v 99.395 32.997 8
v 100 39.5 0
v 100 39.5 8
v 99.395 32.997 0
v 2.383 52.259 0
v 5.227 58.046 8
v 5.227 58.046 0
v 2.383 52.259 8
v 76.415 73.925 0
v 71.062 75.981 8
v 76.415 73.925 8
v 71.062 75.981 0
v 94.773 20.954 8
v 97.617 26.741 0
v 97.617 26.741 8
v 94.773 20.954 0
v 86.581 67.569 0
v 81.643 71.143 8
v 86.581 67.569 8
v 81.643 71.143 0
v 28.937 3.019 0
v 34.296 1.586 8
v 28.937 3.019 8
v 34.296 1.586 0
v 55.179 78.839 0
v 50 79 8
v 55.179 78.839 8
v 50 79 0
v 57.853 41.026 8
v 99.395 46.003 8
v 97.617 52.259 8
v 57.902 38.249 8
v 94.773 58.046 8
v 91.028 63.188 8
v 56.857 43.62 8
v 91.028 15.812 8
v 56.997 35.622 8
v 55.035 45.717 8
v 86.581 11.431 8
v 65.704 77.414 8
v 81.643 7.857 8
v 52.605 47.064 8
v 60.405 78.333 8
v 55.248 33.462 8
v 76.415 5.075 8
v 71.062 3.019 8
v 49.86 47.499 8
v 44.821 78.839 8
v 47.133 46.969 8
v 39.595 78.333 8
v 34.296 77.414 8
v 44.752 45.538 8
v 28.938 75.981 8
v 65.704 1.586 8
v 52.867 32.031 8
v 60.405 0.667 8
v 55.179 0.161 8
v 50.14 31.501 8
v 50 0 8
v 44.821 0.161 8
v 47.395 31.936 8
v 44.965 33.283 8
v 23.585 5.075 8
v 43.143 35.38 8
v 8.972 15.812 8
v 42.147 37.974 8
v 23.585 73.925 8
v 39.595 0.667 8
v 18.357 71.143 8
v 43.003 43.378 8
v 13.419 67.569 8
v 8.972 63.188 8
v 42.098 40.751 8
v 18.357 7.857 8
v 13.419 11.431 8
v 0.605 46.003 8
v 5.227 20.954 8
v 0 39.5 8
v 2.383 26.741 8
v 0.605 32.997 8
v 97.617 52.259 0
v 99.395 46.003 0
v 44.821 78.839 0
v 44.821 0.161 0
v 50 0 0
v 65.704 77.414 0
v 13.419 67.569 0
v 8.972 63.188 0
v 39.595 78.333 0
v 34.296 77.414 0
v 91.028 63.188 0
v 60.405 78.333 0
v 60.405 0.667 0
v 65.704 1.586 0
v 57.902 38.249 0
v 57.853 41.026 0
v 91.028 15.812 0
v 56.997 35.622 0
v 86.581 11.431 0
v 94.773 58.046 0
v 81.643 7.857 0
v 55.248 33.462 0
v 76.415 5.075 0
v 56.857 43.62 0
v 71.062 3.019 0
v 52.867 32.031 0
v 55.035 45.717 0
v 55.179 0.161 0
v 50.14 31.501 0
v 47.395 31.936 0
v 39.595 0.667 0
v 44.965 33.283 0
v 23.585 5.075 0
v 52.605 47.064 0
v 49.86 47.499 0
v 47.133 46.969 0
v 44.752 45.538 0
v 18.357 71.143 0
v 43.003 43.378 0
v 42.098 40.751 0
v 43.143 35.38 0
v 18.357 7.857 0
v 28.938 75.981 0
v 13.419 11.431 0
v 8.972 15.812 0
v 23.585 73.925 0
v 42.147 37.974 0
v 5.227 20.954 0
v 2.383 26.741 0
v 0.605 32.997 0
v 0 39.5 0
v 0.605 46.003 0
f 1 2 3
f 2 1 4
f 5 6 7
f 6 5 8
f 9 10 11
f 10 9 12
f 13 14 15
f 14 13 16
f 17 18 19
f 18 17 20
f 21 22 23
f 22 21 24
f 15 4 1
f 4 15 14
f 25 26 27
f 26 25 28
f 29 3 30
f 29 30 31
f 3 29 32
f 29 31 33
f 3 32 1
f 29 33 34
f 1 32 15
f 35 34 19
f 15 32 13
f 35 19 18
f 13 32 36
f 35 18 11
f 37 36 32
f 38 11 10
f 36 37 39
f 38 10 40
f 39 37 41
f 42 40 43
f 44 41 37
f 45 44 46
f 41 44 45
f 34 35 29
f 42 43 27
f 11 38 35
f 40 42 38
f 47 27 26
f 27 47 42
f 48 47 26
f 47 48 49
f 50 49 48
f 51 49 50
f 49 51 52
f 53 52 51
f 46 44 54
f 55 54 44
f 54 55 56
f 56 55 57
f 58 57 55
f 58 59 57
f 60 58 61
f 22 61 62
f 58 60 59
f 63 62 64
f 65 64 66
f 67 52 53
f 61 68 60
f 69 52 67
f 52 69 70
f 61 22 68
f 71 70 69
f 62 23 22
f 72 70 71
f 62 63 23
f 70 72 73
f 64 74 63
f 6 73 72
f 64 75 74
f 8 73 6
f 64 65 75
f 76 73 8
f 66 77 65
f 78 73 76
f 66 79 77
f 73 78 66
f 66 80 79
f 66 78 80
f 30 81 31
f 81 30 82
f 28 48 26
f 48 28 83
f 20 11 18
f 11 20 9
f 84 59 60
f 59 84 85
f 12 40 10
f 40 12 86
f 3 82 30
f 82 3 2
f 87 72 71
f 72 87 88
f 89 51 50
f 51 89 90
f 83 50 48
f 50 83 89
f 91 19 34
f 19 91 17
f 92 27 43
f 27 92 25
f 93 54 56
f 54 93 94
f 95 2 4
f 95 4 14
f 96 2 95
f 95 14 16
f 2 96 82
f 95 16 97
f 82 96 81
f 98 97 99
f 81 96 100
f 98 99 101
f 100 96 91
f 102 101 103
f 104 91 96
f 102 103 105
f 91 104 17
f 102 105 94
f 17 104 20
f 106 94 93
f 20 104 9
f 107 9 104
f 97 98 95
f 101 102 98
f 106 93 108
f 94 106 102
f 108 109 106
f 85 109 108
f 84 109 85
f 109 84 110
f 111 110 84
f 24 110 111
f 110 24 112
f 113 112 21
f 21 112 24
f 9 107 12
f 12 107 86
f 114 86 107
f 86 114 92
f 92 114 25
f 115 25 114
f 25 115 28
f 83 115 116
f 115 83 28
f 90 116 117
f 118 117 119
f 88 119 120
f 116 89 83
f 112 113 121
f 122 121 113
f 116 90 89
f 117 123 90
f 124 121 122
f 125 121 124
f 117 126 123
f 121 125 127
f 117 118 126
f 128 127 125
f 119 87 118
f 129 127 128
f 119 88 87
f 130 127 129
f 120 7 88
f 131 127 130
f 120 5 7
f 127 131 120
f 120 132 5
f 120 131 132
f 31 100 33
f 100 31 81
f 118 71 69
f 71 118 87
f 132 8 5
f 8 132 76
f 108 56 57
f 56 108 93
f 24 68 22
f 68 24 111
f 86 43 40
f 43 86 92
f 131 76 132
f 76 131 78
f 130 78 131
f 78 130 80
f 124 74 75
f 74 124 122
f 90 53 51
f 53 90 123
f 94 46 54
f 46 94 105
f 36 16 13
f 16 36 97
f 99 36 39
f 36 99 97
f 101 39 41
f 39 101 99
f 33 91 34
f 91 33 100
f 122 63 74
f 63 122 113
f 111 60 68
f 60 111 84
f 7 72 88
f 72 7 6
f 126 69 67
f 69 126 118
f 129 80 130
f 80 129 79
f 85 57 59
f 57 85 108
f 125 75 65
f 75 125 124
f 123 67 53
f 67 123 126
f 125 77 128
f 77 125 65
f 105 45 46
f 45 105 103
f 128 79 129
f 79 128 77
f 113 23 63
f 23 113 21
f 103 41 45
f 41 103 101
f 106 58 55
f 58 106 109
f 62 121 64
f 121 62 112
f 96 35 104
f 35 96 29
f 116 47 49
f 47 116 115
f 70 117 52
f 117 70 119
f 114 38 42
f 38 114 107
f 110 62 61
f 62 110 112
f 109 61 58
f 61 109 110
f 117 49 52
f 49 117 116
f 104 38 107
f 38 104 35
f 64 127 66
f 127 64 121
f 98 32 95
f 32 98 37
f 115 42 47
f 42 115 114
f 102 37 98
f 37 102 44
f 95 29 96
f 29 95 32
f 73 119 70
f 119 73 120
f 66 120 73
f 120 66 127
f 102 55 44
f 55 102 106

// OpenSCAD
$fn = 32;

// ----------------------------------------------------------------------
// Cam plate: double_lobe cam, base R36
// ----------------------------------------------------------------------

// --- parameters (mm) ---
base_r = 36;              // base circle radius
lobe_h = 14;              // cam lobe rise
bore_r = 8;               // shaft bore radius
plate_t = 8;              // plate thickness, Z (extrusion height)

profile = [[100, 39.5], [99.395, 46.003], [97.617, 52.259], [94.773, 58.046], [91.028, 63.188], [86.581, 67.569], [81.643, 71.143], [76.415, 73.925], [71.062, 75.981], [65.704, 77.414], [60.405, 78.333], [55.179, 78.839], [50, 79], [44.821, 78.839], [39.595, 78.333], [34.296, 77.414], [28.938, 75.981], [23.585, 73.925], [18.357, 71.143], [13.419, 67.569], [8.972, 63.188], [5.227, 58.046], [2.383, 52.259], [0.605, 46.003], [0, 39.5], [0.605, 32.997], [2.383, 26.741], [5.227, 20.954], [8.972, 15.812], [13.419, 11.431], [18.357, 7.857], [23.585, 5.075], [28.937, 3.019], [34.296, 1.586], [39.595, 0.667], [44.821, 0.161], [50, 0], [55.179, 0.161], [60.405, 0.667], [65.704, 1.586], [71.062, 3.019], [76.415, 5.075], [81.643, 7.857], [86.581, 11.431], [91.028, 15.812], [94.773, 20.954], [97.617, 26.741], [99.395, 32.997]];  // primary outline, 48 points, counter clockwise
void_1 = [[57.853, 41.026], [56.857, 43.62], [55.035, 45.717], [52.605, 47.064], [49.86, 47.499], [47.133, 46.969], [44.752, 45.538], [43.003, 43.378], [42.098, 40.751], [42.147, 37.974], [43.143, 35.38], [44.965, 33.283], [47.395, 31.936], [50.14, 31.501], [52.867, 32.031], [55.248, 33.462], [56.997, 35.622], [57.902, 38.249]];  // shaft bore, 18 points

// --- the one profile operation ---
difference() {
  linear_extrude(height = plate_t) polygon(points = profile);
  translate([0, 0, -1])
    linear_extrude(height = plate_t + 2) polygon(points = void_1);
}
